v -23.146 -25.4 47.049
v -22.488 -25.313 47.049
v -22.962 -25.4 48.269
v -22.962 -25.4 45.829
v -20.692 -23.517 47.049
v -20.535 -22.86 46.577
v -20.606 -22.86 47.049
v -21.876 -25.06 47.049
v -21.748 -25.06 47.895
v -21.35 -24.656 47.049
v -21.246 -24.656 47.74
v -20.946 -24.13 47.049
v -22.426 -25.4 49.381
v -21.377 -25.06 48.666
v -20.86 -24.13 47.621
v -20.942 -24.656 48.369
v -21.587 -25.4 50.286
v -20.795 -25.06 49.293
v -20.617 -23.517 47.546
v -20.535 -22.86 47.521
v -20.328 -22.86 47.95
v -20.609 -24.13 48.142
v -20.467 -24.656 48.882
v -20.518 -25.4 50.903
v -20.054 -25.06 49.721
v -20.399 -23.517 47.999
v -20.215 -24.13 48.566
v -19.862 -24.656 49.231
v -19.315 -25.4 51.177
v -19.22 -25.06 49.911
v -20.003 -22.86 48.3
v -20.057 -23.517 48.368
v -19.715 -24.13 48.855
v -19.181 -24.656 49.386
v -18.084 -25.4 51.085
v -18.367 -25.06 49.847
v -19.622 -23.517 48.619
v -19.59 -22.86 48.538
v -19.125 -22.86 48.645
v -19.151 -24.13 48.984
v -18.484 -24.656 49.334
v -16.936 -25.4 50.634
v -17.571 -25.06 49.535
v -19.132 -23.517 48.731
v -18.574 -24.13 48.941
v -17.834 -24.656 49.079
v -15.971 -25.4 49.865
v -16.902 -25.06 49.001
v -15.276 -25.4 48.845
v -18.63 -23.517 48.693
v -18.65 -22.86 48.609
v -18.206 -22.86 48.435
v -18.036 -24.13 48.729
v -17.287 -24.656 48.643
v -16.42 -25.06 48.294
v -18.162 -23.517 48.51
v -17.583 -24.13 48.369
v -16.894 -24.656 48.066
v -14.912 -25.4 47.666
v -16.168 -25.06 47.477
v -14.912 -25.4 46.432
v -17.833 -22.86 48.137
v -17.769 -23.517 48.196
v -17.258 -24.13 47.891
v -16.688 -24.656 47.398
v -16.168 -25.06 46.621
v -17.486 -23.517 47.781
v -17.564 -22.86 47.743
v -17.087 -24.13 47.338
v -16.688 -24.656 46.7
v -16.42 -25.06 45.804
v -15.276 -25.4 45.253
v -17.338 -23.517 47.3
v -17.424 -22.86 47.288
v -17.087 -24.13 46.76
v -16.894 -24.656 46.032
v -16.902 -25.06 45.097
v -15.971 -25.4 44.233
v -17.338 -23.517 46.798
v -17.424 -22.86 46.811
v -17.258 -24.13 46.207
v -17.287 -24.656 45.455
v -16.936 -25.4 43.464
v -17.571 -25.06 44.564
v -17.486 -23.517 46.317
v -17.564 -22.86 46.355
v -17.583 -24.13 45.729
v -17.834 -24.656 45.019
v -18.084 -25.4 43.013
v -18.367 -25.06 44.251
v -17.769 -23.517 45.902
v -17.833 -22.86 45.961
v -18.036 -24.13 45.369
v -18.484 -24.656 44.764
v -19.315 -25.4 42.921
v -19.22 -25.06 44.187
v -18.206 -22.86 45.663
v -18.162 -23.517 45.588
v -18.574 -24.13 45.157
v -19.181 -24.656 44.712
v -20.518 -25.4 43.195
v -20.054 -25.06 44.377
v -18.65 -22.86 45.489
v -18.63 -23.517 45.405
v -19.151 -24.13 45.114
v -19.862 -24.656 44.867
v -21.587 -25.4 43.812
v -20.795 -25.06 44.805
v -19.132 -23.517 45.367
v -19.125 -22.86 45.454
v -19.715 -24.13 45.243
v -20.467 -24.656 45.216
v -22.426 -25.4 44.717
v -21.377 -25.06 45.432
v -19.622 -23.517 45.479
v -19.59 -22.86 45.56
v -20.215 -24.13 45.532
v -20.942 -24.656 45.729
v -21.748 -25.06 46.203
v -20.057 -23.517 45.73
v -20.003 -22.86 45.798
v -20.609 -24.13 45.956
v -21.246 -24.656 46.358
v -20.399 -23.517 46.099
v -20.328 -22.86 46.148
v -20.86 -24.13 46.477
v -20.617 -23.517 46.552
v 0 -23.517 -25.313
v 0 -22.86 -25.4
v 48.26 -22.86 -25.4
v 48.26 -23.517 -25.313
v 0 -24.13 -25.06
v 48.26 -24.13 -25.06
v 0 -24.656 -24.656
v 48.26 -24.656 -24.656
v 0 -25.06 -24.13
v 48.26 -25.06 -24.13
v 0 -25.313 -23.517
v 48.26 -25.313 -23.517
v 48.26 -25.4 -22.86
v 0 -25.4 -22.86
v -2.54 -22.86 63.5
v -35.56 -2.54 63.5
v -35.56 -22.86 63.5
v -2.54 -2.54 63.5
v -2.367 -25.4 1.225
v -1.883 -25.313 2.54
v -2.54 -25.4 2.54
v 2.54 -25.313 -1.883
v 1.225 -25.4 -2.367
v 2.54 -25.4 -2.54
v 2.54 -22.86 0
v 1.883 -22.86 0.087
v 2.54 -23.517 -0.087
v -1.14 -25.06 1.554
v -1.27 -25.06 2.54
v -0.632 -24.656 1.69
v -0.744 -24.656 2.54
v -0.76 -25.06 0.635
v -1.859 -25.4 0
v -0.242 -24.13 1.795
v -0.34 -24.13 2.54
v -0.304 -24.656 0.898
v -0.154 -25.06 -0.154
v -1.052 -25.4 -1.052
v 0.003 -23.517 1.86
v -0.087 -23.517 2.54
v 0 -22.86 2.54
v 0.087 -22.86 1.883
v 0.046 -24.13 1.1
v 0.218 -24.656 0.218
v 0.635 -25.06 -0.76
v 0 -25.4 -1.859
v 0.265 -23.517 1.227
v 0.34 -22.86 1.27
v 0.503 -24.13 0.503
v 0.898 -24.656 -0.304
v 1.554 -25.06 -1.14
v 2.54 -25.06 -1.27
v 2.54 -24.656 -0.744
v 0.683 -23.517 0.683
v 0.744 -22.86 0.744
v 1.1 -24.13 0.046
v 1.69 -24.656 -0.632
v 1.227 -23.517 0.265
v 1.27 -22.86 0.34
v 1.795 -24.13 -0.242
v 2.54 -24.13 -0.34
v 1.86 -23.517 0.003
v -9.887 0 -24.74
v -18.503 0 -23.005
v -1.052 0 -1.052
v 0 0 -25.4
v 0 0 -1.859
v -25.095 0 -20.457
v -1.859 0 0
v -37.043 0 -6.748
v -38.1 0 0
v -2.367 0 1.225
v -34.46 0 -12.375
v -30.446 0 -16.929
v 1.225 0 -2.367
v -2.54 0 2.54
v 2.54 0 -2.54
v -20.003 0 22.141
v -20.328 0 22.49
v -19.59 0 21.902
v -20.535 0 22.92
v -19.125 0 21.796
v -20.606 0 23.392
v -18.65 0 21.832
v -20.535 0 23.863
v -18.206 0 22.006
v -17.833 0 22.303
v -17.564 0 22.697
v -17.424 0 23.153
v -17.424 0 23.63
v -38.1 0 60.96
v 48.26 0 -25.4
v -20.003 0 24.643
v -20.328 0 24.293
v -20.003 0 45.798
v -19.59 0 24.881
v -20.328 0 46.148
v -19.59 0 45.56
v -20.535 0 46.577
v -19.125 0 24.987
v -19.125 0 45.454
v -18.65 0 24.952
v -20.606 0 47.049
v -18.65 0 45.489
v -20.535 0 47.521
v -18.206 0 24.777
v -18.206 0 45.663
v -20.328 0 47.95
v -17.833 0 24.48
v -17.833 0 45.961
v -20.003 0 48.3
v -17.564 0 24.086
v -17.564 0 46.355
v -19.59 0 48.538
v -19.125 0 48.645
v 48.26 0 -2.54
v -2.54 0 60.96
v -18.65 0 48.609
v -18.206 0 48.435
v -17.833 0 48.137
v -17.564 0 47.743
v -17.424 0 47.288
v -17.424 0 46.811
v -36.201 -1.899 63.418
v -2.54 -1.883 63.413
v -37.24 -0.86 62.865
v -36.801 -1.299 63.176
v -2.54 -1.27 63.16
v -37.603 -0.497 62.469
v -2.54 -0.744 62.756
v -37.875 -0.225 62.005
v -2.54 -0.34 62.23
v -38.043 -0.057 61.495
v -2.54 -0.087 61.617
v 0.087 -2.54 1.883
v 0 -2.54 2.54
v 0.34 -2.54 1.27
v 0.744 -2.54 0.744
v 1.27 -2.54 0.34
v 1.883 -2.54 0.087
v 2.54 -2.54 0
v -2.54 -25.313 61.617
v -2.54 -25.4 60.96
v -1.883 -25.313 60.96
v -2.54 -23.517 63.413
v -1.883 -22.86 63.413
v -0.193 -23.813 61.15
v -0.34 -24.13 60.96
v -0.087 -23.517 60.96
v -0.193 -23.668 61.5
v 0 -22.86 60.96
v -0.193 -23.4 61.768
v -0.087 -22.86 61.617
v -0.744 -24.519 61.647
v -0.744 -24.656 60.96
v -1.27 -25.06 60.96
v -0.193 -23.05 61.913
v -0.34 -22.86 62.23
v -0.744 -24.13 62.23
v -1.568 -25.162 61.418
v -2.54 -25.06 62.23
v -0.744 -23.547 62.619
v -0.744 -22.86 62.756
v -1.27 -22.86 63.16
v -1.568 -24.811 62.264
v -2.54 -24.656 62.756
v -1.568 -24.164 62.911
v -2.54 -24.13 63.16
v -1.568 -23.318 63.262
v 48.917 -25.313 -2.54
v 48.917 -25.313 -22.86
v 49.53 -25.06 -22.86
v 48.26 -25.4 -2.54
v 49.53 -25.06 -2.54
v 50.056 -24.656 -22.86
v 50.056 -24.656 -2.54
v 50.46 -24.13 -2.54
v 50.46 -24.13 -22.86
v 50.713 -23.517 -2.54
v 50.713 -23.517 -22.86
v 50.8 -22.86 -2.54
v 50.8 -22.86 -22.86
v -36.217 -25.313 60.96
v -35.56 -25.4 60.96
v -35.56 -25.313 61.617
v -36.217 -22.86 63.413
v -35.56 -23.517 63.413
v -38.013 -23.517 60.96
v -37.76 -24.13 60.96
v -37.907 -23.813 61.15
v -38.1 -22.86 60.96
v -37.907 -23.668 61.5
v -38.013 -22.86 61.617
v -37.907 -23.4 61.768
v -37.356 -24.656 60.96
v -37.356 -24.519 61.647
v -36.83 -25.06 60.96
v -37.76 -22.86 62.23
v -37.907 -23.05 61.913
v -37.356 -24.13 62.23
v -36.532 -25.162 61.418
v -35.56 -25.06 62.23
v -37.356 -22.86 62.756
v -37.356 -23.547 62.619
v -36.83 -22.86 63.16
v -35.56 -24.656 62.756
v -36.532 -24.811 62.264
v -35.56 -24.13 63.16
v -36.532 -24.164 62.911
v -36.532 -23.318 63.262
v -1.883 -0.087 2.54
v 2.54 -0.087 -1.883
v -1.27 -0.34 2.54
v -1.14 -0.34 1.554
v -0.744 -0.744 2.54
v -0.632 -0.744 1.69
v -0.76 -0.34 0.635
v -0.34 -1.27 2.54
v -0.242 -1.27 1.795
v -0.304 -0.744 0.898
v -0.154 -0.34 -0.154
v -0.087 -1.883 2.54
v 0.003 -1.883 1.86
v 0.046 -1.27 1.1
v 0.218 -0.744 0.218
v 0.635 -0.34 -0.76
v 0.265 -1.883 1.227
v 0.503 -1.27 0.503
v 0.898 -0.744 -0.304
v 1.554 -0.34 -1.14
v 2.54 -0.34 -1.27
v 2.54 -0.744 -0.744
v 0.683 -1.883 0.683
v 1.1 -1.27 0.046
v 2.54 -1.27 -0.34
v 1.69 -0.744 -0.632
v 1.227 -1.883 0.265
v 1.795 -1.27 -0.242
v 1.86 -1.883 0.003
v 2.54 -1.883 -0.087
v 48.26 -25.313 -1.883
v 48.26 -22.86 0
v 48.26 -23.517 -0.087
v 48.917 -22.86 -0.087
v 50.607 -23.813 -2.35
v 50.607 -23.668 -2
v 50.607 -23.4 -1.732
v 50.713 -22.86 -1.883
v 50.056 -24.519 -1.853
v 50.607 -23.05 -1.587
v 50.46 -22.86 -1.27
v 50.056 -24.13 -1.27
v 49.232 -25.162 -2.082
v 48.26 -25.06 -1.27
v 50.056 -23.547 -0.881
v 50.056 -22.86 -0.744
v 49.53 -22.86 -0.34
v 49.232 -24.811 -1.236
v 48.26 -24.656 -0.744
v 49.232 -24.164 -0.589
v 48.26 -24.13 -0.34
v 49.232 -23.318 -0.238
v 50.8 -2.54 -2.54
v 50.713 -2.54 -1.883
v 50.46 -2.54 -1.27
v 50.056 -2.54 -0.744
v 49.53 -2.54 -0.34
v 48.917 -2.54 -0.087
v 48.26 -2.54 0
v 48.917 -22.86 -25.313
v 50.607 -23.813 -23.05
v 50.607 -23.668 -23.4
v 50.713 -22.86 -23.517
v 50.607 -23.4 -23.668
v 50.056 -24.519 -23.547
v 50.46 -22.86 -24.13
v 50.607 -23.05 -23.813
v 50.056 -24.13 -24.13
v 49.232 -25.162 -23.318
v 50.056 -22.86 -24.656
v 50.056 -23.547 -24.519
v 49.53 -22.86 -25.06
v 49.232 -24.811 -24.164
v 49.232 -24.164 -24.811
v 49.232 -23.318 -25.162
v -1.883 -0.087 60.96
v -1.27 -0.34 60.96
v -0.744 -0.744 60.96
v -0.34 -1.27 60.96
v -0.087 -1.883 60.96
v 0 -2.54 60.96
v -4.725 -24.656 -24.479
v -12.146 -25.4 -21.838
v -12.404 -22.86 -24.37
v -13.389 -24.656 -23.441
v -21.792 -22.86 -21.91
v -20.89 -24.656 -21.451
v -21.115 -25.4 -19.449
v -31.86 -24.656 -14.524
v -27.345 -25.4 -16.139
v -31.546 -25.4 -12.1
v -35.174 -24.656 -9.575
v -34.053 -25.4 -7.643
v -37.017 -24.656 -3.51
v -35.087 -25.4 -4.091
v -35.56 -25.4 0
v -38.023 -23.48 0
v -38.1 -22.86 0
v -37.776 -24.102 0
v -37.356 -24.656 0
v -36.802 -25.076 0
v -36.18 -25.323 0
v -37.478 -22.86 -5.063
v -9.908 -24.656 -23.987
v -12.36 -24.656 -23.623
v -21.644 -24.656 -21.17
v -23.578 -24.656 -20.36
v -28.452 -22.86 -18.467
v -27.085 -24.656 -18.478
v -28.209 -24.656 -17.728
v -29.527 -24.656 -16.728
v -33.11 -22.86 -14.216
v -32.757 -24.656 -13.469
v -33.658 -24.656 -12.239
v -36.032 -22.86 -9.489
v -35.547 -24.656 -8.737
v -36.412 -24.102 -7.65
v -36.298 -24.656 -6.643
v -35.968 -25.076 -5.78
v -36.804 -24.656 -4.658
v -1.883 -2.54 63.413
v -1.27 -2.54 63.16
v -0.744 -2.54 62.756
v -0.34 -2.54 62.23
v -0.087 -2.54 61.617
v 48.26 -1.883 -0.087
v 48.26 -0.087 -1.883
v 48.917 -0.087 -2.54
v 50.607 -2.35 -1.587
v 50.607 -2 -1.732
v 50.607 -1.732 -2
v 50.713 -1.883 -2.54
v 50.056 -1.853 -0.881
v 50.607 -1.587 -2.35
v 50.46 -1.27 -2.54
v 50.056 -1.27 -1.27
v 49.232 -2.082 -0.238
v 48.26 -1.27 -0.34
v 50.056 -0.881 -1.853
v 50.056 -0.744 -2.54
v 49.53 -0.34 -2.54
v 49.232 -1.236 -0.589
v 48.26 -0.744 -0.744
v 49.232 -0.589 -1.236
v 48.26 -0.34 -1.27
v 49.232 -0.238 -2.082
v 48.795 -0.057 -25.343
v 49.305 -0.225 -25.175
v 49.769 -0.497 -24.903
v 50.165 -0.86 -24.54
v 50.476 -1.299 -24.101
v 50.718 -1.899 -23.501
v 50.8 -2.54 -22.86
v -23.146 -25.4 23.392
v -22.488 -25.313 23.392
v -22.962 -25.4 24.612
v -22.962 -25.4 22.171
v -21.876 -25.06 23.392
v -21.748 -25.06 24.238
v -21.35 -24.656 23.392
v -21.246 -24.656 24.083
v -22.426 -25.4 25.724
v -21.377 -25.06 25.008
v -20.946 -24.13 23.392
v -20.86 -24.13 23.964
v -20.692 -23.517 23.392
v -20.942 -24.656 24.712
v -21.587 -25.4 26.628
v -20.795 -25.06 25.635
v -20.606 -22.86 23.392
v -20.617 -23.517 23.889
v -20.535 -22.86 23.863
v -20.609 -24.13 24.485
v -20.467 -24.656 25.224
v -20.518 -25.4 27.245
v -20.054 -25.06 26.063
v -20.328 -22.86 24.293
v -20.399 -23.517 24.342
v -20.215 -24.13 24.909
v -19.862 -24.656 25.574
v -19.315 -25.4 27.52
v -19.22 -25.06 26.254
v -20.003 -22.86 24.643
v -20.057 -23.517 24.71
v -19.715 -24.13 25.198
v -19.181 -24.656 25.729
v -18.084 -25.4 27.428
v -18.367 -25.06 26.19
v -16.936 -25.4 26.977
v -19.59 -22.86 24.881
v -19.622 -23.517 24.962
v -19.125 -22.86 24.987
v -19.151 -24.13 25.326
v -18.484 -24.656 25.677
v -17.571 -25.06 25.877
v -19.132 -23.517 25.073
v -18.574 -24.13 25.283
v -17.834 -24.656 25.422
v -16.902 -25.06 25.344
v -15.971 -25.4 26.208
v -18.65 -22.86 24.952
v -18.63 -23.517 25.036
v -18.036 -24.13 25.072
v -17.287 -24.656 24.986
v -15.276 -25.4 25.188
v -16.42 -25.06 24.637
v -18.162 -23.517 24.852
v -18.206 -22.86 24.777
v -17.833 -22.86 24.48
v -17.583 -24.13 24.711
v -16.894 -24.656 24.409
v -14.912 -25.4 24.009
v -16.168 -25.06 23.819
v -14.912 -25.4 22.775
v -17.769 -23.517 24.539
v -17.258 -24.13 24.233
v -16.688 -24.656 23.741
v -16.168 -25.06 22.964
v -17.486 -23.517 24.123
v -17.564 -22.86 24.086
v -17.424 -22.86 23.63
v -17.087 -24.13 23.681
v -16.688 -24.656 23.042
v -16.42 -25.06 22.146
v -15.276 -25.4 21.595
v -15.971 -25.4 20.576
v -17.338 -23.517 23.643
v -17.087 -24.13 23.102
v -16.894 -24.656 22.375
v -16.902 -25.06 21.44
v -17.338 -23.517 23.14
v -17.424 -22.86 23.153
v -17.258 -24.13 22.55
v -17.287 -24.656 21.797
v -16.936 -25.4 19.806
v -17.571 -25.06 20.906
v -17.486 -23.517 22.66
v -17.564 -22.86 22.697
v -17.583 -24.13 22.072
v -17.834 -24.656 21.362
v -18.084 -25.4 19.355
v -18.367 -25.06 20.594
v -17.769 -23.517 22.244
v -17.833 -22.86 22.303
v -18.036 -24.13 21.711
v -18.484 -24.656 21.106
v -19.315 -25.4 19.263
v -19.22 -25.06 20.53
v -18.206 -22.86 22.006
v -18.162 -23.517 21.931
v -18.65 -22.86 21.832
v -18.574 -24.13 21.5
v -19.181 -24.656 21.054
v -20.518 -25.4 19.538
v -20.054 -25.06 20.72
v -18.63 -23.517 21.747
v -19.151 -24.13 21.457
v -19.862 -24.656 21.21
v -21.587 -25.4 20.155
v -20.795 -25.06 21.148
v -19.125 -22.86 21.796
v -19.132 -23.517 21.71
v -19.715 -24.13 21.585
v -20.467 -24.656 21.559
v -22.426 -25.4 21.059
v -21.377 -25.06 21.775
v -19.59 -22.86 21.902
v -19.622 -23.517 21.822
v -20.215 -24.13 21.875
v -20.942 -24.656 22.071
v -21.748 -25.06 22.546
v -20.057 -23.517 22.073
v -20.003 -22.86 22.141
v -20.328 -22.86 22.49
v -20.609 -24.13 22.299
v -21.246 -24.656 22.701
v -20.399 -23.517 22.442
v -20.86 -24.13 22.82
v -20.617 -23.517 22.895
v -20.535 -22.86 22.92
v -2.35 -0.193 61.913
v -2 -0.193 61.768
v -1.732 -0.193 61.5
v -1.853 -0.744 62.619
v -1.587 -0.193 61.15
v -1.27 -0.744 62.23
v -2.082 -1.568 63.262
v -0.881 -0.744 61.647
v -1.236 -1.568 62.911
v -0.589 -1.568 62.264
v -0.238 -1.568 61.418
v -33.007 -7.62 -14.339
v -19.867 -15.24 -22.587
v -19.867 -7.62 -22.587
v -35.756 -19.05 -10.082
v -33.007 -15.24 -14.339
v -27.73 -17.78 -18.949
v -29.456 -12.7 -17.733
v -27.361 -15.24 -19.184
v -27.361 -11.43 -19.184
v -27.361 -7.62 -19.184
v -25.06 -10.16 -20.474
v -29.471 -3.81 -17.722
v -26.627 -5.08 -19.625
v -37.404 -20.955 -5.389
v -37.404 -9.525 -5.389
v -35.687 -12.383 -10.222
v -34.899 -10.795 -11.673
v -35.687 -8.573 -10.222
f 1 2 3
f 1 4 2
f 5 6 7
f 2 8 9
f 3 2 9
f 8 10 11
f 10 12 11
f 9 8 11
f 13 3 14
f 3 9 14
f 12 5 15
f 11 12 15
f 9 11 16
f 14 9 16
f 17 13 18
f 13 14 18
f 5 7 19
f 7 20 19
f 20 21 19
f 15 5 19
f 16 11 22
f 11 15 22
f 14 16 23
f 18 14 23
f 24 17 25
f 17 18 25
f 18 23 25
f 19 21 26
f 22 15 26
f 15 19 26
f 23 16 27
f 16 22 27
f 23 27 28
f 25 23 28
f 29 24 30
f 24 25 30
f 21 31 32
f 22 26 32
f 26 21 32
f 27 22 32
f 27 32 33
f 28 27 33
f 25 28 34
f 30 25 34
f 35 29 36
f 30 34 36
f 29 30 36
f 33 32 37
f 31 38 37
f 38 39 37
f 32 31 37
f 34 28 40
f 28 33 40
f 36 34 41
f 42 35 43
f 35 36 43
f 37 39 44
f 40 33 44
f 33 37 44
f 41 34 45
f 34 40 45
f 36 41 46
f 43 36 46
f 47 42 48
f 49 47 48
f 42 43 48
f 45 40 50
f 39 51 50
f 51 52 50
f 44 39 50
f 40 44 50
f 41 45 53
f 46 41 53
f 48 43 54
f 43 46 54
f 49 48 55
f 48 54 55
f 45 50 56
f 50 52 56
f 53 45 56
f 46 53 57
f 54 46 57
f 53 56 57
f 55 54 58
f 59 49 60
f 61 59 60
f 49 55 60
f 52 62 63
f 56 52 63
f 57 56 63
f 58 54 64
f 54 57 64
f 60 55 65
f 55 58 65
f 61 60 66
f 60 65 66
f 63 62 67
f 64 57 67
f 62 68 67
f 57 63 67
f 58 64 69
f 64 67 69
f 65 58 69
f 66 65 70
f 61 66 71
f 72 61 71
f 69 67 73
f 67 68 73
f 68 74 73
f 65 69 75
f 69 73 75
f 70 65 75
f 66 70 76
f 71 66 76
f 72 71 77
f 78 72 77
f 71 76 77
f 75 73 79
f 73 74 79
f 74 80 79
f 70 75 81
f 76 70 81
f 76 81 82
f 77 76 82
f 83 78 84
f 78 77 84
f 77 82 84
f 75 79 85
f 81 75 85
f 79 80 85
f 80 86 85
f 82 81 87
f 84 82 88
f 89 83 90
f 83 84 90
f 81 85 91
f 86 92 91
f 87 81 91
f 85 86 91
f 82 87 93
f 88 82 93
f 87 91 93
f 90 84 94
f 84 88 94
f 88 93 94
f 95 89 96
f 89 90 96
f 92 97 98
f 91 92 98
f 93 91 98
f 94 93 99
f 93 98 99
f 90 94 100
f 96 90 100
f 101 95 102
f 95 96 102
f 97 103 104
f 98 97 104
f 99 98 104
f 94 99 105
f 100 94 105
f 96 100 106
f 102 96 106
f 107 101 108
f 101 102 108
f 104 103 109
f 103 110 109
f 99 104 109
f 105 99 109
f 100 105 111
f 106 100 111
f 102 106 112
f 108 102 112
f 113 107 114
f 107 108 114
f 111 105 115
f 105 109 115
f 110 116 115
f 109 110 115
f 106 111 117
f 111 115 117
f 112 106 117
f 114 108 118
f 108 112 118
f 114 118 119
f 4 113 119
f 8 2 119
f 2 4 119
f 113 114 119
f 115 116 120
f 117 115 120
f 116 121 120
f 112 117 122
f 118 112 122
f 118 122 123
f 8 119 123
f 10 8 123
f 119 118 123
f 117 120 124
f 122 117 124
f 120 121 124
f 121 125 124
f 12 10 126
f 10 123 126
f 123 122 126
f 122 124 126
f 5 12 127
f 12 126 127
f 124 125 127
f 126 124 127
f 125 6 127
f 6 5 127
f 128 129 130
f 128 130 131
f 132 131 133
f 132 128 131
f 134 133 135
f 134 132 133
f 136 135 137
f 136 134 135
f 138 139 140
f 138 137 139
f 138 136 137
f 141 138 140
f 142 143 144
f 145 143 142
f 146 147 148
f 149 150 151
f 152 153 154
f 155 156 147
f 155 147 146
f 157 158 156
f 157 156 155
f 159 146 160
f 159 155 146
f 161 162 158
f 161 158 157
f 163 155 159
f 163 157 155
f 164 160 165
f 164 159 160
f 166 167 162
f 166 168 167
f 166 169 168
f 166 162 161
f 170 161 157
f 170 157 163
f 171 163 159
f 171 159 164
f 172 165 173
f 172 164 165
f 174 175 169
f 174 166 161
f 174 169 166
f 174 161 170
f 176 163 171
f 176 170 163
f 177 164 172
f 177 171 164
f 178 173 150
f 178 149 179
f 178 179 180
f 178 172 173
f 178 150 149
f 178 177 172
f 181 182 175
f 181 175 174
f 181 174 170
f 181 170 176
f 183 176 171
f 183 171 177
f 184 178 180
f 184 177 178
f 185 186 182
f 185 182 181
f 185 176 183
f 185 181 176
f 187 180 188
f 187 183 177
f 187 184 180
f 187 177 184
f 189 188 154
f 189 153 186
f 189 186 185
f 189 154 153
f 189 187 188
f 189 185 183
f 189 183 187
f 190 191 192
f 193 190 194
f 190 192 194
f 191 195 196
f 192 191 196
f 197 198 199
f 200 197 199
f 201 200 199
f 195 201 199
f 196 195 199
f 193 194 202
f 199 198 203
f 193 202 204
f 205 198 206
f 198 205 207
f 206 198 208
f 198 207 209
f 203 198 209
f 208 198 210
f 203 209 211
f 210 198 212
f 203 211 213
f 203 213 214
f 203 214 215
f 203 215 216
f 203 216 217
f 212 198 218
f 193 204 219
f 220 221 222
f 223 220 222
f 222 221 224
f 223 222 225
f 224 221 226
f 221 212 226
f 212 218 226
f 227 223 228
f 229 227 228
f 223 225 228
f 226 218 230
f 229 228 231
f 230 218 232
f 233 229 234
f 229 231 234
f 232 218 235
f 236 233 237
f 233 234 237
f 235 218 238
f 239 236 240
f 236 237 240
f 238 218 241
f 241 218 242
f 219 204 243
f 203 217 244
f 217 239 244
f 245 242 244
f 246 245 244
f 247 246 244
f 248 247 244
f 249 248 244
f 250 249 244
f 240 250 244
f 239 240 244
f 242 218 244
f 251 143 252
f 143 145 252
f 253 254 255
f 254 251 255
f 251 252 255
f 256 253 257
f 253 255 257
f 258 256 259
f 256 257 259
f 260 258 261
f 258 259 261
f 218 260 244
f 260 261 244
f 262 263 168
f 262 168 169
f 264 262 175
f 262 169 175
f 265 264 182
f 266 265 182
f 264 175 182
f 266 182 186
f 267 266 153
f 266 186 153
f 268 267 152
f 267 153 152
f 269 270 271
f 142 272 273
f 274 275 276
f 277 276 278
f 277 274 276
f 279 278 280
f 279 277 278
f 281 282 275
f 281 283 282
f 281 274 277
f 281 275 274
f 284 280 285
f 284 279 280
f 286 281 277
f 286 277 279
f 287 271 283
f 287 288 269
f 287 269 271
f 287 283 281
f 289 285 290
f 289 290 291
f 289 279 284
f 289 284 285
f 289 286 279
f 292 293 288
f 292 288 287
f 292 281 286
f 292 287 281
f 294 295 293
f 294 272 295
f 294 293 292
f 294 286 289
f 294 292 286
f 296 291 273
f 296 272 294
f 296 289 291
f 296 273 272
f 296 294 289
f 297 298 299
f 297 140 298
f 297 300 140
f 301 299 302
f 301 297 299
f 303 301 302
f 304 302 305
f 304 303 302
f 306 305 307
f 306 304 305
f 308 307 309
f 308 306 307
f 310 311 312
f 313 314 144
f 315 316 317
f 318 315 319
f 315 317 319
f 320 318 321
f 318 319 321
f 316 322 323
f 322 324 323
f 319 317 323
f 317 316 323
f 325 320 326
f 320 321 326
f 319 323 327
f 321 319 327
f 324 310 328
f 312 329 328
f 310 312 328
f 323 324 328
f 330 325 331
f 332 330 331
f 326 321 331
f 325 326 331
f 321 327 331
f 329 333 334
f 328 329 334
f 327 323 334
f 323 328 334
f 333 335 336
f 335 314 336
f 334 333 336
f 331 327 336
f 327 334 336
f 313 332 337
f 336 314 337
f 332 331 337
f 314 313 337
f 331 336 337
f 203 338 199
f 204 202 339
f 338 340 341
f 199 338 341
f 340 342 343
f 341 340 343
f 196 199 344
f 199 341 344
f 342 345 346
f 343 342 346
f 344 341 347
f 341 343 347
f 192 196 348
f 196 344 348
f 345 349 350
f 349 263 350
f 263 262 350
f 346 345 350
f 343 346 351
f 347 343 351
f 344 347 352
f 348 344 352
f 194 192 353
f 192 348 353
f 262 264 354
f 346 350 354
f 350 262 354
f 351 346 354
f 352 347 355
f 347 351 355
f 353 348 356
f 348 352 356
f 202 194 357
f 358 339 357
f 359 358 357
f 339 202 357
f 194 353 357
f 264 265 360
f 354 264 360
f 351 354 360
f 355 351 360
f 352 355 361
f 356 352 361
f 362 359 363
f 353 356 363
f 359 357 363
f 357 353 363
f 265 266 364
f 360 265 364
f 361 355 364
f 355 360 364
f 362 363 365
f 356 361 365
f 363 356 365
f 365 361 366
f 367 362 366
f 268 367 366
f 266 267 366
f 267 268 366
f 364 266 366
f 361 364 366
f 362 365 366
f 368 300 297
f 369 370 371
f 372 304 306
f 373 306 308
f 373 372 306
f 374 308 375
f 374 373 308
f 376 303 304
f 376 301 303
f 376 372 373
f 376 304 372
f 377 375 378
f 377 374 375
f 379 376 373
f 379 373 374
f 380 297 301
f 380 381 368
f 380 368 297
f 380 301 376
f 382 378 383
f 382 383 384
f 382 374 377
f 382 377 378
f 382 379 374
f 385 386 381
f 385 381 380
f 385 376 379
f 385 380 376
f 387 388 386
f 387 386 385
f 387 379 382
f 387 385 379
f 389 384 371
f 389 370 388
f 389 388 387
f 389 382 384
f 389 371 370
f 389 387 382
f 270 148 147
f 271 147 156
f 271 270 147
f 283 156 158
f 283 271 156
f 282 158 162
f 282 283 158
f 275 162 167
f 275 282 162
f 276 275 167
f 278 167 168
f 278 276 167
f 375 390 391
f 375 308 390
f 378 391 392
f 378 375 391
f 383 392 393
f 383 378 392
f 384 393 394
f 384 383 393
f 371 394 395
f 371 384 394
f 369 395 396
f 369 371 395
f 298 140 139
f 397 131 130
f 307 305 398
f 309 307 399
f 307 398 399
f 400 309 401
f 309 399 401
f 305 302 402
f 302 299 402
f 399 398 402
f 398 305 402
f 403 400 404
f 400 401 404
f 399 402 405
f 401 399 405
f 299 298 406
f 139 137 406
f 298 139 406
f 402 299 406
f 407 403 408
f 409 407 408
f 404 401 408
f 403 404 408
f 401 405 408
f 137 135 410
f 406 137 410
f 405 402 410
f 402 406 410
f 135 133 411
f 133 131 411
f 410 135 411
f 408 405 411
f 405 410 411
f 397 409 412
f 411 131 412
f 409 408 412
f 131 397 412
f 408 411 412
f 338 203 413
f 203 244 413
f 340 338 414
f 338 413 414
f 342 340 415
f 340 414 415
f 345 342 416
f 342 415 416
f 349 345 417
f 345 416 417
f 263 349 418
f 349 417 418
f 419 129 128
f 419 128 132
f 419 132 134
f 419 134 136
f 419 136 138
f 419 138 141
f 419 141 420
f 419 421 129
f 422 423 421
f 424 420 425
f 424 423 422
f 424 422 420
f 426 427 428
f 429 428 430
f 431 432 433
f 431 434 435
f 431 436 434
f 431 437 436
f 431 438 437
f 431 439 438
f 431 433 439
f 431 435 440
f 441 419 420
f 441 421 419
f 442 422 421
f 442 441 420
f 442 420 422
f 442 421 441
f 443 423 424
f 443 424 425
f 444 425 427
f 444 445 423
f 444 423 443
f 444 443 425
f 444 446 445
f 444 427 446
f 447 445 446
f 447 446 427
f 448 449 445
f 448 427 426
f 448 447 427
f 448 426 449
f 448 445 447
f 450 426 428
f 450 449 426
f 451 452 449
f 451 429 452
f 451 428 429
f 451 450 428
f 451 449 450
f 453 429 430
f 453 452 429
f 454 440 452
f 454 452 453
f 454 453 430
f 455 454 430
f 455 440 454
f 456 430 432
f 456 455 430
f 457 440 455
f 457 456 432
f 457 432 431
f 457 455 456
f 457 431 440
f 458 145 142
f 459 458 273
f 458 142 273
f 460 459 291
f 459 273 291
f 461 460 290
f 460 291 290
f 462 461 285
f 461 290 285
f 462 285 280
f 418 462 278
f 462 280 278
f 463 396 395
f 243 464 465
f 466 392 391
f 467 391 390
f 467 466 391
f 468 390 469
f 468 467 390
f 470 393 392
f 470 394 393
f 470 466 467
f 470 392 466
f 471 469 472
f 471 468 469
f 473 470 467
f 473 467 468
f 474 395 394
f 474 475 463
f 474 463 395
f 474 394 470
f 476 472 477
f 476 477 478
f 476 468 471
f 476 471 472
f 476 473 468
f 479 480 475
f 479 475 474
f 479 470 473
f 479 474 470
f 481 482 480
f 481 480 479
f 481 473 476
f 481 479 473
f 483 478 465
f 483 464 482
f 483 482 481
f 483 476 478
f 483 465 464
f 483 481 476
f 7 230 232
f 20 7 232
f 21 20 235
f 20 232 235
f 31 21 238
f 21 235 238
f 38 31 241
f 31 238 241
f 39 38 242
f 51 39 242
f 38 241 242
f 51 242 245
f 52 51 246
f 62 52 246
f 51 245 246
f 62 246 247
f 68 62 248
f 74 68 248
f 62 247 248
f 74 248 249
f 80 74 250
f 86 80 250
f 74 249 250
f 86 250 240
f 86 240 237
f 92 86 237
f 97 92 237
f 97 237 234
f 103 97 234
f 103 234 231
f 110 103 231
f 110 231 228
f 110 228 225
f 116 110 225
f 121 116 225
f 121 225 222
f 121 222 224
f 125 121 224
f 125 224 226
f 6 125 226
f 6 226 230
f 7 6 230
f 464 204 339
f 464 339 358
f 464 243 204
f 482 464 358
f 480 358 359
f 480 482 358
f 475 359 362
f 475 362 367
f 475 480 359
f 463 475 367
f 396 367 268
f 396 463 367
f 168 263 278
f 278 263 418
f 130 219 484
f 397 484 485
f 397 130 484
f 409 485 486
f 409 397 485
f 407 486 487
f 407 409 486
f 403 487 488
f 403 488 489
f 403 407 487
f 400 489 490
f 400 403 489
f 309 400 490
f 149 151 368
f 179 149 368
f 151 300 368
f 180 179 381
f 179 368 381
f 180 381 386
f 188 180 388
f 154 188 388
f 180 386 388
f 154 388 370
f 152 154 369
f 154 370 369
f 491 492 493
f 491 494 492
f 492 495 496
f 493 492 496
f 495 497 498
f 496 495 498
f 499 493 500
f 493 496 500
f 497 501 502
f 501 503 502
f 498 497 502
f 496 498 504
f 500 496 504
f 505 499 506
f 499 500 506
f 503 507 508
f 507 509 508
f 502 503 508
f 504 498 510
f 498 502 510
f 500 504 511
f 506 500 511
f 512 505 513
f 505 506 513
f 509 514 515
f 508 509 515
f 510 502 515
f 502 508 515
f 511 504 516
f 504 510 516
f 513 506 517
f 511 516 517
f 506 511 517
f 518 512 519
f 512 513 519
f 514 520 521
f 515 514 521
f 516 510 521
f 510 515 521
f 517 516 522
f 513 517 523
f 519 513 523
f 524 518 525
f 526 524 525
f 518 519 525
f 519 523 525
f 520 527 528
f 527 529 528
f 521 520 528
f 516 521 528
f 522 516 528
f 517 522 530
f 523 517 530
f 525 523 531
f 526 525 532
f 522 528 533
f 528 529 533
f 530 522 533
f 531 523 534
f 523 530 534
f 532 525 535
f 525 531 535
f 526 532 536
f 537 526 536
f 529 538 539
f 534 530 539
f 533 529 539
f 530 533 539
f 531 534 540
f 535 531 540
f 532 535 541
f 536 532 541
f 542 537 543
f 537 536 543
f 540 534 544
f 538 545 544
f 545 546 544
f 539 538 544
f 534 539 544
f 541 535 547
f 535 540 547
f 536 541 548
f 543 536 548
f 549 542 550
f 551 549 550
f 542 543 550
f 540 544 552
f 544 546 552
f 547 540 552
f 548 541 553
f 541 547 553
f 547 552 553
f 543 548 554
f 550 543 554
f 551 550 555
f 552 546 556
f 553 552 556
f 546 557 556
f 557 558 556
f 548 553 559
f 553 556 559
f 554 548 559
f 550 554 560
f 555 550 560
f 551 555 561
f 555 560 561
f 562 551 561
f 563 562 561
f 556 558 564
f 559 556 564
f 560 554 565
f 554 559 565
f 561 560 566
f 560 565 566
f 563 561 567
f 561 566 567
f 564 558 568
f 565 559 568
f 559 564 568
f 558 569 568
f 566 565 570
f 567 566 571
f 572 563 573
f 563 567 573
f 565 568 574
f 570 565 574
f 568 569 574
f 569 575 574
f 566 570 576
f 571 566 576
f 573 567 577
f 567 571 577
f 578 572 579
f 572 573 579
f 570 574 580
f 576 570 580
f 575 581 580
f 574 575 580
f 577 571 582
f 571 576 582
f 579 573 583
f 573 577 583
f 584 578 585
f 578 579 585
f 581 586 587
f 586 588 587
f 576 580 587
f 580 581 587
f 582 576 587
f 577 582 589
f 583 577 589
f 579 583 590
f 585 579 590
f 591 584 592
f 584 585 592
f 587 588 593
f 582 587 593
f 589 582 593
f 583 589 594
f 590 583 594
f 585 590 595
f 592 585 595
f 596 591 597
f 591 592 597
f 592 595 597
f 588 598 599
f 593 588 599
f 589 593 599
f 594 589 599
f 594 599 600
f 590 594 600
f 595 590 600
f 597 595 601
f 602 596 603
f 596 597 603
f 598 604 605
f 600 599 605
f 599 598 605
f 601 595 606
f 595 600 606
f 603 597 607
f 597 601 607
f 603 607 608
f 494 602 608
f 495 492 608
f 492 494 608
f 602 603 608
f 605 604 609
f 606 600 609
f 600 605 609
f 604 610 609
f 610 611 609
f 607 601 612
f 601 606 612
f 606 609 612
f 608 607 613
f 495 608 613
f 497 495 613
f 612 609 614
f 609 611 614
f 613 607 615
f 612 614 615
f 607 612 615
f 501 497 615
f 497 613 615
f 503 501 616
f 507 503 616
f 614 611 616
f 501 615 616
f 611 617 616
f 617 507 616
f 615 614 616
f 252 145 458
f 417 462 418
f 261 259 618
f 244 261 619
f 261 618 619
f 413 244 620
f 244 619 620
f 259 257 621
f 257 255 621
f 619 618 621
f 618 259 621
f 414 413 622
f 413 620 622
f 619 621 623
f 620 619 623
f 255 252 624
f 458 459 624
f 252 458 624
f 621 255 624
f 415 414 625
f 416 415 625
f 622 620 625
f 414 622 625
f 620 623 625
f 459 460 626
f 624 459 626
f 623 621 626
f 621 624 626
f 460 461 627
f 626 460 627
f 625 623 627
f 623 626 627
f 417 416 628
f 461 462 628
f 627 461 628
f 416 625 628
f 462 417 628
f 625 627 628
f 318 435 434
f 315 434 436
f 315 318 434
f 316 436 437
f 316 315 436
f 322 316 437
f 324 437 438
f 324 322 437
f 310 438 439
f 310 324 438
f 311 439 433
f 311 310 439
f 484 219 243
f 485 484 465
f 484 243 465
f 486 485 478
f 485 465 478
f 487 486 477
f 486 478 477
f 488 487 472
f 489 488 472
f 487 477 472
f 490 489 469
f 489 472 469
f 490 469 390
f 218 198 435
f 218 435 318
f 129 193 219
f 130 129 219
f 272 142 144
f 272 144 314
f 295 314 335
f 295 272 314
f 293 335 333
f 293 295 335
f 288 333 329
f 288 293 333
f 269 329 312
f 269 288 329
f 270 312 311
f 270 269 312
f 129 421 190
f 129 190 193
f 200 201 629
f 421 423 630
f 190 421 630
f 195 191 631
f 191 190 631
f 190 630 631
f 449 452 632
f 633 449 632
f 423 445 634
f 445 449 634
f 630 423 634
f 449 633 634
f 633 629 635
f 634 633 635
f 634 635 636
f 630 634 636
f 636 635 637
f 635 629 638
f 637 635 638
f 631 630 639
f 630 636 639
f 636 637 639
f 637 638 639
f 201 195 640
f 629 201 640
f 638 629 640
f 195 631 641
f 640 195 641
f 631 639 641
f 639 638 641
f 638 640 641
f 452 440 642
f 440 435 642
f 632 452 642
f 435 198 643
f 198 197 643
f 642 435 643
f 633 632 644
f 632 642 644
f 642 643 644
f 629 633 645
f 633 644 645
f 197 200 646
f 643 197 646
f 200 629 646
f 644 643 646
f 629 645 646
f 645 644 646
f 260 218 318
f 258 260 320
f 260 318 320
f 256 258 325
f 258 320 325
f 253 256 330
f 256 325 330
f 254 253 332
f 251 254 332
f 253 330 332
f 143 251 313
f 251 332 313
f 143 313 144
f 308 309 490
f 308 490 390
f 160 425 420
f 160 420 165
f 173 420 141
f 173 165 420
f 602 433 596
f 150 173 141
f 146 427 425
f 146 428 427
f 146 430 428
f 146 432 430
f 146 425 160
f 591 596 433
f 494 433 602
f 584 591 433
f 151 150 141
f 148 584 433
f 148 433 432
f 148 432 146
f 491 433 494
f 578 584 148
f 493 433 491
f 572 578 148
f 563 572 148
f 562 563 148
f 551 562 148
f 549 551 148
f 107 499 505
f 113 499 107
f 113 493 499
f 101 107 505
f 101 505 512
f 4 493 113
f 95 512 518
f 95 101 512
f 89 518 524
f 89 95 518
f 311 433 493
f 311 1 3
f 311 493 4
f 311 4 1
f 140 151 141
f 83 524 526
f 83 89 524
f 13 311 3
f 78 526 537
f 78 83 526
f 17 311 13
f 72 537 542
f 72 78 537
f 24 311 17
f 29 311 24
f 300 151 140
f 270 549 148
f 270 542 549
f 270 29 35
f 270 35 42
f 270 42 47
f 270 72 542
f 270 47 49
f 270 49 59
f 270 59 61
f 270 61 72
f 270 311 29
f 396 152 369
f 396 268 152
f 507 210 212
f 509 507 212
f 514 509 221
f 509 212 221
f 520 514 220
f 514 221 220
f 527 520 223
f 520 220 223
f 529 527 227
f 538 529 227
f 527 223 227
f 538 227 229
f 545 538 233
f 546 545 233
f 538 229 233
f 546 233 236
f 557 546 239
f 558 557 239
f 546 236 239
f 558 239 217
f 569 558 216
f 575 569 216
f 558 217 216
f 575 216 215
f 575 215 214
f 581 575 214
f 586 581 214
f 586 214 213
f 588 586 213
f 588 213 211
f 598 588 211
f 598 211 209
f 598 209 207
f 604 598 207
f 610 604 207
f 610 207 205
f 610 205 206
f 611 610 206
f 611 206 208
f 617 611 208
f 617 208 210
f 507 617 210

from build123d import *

# Parameters (mm, degrees)
F0_W     = 38.1
F0_H     = 63.5
F0_W_2   = 50.8
F0_H_2   = 25.4
F1_DEPTH = 25.4
F3_D     = 3.2
F4_R     = 2.54


with BuildPart() as f1:
    # F0 (on Front) → F1 (new body)
    with BuildSketch(Plane.XZ):
        with Locations((-19.05, 31.75)):
            Rectangle(F0_W, F0_H)
        with BuildLine():
            Line((0, 0), (-38.1, 0))
            add(Edge.make_bspline(
                [(-38.1, 0), (-37.4712883283, -17.6039609522), (-22.7908427074, -25.0856452655), (0, -25.4)],
                knots=[0, 0, 0, 0, 45.7905011984, 45.7905011984, 45.7905011984, 45.7905011984], degree=3))
            Line((0, -25.4), (0, 0))
        make_face()
        with Locations((25.4, -12.7)):
            Rectangle(F0_W_2, F0_H_2)
    extrude(amount=F1_DEPTH)

    # F3 (through all)
    with Locations(Plane.XZ.offset(25.4)):
        with Locations((-19.0056972206, 47.0490716398), (-19.0056972206, 23.3916286379)):
            Hole(F3_D / 2)

    # F4
    f4_edges = [f1.edges().sort_by_distance(p)[0] for p in [
        (-19.05, -25.4, 63.5),
        (0, -25.4, 31.75),
        (-38.1, -25.4, 31.75),
        (25.4, -25.4, 0),
        (-25.00043, -25.4, -20.504125),
        (50.8, -25.4, -12.7),
        (25.4, -25.4, -25.4),
        (-20.605697, -25.4, 23.391629),
        (-20.605697, -25.4, 47.049072),
        (0, -12.7, 63.5),
        (-38.1, -12.7, 63.5),
        (-19.05, 0, 63.5),
        (0, -12.7, 0),
        (0, 0, 31.75),
        (25.4, 0, 0),
        (50.8, -12.7, -25.4),
        (50.8, -12.7, 0),
        (50.8, 0, -12.7),
    ]]
    fillet(f4_edges, radius=F4_R)


solid = f1.part
